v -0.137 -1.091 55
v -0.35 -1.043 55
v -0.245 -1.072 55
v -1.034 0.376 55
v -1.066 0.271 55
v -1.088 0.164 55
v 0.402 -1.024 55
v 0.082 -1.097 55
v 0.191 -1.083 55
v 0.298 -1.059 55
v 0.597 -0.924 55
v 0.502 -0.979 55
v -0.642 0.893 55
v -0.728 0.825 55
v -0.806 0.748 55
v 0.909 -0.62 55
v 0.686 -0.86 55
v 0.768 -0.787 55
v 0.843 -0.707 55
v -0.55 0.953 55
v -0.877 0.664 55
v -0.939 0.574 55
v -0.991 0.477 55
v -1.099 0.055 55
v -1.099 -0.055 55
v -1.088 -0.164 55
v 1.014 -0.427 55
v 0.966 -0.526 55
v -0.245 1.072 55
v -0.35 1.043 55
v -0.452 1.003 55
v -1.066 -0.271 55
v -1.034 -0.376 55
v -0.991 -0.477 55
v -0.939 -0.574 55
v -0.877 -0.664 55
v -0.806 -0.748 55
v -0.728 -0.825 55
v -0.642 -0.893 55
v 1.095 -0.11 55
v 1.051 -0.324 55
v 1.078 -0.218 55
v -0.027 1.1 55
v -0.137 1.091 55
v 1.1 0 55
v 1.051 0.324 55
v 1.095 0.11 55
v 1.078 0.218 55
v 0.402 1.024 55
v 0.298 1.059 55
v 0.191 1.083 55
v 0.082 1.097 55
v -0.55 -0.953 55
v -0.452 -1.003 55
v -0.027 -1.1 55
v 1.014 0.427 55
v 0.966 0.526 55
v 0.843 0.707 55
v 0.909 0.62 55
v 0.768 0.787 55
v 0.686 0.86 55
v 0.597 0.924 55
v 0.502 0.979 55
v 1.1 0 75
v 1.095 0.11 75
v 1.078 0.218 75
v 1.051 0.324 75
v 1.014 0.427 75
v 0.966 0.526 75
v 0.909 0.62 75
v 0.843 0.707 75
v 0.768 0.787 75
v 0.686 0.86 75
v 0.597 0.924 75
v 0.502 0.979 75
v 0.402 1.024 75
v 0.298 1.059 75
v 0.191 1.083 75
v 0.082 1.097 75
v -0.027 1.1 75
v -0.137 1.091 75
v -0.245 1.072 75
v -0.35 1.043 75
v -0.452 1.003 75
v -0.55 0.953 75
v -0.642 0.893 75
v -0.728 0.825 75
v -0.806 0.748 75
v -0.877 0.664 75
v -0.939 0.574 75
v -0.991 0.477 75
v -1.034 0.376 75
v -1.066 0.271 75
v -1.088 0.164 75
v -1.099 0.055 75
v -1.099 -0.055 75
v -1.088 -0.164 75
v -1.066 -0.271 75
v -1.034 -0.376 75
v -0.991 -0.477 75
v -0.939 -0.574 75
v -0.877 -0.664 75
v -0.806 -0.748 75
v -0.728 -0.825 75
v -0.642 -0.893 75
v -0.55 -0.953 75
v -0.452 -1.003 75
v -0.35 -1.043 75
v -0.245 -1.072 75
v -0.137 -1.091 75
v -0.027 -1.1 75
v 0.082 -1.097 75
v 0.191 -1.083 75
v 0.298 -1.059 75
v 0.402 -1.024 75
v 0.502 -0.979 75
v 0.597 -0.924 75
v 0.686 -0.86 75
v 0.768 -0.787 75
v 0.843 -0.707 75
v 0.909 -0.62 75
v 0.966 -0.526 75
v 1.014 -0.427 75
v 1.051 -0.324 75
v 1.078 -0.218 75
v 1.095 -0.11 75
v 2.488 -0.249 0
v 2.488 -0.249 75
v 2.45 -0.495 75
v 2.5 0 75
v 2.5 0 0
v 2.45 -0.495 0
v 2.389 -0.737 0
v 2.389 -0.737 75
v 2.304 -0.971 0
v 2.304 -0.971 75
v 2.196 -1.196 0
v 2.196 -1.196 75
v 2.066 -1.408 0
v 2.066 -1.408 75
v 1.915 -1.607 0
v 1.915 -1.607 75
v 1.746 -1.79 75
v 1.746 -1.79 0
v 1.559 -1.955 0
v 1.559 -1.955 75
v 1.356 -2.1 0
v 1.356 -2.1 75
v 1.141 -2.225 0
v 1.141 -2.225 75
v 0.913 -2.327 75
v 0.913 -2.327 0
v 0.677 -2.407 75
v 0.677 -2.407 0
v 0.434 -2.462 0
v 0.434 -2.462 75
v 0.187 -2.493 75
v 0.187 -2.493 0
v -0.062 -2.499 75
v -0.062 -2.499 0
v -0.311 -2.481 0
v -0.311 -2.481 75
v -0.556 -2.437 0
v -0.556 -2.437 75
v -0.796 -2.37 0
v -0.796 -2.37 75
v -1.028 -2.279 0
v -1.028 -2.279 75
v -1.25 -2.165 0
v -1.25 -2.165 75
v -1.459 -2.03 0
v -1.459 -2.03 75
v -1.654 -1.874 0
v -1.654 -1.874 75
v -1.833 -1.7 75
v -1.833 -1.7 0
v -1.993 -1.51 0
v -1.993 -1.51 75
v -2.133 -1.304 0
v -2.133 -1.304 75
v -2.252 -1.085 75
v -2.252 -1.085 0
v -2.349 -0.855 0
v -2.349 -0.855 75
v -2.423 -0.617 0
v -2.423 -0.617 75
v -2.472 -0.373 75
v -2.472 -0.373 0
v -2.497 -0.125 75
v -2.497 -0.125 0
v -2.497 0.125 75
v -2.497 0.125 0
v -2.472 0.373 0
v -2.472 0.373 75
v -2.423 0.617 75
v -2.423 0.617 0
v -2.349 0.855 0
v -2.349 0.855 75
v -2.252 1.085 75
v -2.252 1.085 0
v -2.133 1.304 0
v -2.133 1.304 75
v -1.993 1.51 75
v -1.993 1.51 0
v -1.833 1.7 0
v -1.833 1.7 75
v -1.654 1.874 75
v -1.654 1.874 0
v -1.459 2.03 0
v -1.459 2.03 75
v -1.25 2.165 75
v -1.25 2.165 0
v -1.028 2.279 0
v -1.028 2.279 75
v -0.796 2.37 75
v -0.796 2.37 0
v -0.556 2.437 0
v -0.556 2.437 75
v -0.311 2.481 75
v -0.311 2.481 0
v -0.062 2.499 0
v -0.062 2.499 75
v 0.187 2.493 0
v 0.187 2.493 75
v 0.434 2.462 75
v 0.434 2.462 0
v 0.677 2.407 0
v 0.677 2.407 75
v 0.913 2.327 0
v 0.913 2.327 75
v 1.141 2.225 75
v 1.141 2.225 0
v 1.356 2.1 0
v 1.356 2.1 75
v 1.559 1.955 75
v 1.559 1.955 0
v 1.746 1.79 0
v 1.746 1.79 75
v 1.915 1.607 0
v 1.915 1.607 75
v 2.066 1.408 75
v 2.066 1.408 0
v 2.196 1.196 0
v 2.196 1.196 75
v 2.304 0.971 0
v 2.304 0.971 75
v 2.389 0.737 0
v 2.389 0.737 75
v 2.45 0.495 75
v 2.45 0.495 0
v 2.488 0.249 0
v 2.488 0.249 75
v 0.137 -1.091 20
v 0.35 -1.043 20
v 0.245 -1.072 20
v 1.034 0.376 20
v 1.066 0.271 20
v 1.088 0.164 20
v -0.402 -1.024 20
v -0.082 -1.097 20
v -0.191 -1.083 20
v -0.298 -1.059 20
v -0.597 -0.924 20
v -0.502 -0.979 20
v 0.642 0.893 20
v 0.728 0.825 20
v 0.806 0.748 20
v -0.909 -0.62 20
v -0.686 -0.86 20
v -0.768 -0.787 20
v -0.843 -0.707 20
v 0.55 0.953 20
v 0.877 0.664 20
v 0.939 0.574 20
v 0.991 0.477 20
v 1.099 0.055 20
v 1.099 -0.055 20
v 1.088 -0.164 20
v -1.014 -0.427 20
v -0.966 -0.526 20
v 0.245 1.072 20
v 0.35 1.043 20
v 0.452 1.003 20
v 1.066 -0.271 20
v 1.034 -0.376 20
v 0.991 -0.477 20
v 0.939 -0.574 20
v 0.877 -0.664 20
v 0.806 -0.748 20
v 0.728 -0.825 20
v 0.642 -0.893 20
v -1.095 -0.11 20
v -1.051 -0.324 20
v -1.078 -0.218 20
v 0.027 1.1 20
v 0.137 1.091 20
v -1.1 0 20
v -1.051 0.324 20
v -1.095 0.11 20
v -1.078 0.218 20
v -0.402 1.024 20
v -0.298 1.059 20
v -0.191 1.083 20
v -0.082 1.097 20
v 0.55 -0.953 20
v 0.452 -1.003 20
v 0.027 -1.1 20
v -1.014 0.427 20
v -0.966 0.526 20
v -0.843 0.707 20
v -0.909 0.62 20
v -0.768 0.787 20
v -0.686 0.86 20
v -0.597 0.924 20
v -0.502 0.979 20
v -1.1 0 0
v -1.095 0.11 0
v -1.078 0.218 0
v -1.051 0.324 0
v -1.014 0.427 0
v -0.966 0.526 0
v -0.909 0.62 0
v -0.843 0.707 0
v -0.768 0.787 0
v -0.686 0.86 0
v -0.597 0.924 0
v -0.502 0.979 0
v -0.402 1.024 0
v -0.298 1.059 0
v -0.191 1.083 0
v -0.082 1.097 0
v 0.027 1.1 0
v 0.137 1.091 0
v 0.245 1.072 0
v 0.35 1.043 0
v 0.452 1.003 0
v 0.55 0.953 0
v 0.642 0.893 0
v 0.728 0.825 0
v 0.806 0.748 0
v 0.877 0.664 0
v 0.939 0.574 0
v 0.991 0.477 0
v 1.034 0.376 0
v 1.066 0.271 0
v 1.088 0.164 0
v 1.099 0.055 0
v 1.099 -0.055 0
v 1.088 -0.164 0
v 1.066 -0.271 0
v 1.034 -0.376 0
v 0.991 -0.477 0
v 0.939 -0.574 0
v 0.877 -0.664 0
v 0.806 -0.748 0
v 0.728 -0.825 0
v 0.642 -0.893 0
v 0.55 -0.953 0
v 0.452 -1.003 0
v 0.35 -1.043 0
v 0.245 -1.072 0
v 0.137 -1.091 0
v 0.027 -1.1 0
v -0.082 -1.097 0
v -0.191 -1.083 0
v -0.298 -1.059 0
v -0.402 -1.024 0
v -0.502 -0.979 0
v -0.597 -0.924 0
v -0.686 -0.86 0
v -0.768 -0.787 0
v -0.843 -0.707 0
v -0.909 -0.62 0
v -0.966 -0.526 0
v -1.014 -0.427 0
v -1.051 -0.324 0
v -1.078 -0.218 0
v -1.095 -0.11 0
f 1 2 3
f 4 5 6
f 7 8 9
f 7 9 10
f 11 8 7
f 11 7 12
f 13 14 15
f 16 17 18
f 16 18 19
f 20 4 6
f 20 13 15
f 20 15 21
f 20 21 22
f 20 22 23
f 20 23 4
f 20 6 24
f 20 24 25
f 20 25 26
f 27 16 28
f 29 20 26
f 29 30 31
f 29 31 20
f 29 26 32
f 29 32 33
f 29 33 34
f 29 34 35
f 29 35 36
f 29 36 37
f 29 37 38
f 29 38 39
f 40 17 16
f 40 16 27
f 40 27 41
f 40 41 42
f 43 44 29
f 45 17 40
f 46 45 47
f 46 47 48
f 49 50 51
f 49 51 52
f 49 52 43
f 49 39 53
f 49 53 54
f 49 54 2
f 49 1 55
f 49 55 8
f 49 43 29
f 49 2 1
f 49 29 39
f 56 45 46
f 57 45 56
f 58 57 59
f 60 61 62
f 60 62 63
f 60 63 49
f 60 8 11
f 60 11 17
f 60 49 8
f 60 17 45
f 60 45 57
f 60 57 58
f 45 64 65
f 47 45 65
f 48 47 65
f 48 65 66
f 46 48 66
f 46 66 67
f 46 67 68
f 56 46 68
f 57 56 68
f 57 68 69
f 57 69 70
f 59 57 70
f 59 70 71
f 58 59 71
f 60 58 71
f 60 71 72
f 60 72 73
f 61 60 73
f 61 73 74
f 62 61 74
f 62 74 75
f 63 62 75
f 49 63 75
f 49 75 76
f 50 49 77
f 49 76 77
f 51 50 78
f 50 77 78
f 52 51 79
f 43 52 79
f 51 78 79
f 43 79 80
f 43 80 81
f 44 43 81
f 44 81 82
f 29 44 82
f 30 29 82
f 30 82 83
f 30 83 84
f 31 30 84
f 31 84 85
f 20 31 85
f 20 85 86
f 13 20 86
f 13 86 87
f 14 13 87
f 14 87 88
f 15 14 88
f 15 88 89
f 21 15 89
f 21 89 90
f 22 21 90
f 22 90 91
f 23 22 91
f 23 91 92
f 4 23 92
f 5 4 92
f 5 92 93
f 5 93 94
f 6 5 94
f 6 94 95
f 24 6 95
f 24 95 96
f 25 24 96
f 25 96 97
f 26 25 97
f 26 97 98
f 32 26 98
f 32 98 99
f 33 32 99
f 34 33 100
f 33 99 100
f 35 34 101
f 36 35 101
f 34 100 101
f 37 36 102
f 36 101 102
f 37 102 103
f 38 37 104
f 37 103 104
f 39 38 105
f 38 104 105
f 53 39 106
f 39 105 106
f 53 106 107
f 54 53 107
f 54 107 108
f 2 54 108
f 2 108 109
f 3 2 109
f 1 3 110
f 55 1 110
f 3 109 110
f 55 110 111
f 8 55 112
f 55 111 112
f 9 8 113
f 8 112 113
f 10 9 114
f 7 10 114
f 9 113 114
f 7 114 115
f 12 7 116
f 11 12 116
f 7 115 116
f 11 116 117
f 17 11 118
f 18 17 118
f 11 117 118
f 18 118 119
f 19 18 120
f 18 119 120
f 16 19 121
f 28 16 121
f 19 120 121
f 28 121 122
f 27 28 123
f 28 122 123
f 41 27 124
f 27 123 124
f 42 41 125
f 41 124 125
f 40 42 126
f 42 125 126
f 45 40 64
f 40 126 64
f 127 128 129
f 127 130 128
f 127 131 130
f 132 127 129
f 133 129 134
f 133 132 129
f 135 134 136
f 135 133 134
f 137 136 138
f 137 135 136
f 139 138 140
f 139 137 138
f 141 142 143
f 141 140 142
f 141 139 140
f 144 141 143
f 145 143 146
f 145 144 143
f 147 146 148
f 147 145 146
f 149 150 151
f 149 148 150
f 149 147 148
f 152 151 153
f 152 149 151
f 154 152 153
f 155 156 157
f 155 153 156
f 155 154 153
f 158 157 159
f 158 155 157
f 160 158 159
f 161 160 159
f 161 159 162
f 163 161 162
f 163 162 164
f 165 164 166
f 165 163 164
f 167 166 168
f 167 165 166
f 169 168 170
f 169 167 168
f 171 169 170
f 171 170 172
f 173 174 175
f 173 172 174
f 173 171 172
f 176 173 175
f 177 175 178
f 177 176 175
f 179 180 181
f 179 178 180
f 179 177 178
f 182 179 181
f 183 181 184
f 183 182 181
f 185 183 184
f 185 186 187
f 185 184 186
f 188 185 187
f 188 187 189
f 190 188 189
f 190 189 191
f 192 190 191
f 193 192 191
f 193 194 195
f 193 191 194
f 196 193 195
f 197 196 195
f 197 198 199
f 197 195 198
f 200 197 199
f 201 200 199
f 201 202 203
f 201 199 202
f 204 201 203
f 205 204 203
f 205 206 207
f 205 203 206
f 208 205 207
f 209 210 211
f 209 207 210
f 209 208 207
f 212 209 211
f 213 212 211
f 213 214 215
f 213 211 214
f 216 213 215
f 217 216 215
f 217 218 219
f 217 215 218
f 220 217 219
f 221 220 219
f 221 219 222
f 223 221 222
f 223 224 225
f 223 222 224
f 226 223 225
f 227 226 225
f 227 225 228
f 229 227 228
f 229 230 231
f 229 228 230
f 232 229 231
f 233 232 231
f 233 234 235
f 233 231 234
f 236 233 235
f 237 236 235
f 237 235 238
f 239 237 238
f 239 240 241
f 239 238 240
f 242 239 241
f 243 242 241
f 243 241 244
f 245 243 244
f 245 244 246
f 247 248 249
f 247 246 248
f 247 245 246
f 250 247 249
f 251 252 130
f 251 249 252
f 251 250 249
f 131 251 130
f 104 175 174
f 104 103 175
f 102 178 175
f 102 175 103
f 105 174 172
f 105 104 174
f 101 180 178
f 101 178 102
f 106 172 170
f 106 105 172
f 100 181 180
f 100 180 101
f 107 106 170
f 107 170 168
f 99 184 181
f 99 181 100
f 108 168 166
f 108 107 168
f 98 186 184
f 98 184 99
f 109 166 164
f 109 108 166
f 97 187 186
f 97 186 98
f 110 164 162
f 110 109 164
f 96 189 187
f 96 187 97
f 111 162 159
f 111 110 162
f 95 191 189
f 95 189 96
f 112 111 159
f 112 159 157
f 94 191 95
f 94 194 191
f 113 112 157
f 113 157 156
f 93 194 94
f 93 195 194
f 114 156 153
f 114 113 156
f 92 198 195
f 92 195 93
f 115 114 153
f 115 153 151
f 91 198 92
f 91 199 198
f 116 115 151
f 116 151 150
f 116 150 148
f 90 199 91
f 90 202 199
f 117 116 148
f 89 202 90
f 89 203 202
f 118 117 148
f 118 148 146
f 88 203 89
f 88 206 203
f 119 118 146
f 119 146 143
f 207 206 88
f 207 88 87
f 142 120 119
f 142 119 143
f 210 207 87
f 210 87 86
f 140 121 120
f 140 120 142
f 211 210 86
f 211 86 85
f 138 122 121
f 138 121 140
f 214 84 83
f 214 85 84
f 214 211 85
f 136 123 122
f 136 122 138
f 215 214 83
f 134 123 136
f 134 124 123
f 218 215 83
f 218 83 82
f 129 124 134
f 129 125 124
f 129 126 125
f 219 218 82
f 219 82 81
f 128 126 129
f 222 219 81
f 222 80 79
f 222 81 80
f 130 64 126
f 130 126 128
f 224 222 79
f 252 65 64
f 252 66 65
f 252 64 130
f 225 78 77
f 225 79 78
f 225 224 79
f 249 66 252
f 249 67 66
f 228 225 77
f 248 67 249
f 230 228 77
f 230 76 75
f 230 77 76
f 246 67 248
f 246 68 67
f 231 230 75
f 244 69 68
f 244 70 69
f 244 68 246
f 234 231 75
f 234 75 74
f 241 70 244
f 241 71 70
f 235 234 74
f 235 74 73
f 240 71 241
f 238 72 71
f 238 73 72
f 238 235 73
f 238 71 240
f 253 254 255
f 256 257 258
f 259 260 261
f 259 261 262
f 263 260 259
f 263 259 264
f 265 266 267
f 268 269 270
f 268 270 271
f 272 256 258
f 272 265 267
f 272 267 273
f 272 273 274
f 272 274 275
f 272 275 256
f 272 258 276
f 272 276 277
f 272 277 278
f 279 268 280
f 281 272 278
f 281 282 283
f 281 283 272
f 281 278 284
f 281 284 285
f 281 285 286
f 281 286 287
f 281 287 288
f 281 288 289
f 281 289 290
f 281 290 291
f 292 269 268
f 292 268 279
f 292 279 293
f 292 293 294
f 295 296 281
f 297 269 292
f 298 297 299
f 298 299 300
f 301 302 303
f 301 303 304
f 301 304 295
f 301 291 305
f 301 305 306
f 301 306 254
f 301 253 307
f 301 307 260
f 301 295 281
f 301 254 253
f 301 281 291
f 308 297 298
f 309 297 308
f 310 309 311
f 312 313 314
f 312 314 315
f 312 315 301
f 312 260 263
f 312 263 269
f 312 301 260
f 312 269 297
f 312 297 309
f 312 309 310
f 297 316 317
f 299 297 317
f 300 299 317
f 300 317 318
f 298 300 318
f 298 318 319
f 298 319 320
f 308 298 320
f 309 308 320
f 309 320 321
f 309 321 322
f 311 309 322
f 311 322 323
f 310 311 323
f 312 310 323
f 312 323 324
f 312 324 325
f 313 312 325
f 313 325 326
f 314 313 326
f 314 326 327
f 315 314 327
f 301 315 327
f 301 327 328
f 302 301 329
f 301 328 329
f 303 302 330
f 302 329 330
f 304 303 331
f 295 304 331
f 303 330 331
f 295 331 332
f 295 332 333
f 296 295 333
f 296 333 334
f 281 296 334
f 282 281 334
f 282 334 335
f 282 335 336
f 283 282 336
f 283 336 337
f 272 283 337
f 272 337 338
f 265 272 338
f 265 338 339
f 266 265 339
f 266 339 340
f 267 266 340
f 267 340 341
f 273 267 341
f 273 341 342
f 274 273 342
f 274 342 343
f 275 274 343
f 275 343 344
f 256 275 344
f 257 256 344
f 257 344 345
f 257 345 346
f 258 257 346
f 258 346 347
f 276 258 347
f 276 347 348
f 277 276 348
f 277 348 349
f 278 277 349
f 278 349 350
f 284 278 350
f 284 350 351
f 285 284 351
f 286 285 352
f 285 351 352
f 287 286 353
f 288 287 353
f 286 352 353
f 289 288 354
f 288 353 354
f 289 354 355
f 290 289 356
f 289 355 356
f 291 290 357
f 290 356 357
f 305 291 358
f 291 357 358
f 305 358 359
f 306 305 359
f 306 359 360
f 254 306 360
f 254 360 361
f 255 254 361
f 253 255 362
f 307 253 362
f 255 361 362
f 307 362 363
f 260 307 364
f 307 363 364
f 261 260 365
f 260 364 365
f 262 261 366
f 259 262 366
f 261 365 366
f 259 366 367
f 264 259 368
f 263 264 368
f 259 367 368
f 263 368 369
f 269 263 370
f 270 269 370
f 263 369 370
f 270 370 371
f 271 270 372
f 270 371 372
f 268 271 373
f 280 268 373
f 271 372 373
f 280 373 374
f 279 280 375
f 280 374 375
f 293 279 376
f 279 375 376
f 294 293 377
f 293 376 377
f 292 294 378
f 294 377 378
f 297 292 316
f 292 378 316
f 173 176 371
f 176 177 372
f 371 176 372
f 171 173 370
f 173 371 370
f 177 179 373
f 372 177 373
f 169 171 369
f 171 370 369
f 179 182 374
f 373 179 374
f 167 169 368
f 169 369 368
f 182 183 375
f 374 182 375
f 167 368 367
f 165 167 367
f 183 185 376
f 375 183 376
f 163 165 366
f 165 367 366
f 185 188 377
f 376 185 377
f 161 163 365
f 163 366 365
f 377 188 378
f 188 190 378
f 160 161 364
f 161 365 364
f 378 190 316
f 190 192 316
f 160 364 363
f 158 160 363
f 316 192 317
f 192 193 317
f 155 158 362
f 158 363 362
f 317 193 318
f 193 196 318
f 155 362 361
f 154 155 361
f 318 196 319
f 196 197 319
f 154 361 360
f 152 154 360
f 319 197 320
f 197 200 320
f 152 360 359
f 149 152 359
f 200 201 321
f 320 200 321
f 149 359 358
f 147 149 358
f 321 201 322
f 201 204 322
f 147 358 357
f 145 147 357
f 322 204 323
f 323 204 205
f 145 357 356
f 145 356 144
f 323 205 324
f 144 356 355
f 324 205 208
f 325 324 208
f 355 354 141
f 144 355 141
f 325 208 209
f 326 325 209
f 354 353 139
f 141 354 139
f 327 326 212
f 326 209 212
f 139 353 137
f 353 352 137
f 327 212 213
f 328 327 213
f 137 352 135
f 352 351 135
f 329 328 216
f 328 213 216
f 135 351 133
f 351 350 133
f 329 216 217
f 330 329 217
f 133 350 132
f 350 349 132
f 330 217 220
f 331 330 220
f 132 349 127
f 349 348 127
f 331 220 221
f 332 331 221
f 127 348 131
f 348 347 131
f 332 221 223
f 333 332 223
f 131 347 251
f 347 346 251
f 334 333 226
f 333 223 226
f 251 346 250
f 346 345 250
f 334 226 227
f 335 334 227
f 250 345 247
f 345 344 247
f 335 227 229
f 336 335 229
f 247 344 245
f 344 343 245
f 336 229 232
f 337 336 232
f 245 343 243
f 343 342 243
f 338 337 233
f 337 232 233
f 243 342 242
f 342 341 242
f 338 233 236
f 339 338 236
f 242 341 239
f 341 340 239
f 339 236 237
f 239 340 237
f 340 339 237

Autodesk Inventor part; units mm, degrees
ref_plane "YZ Plane" through (0, 0, 0) normal (1, 0, 0) x (0, 1, 0)
ref_plane "XZ Plane" through (0, 0, 0) normal (0, 1, 0) x (-1, 0, 0)
ref_plane "XY Plane" through (0, 0, 0) normal (0, 0, 1) x (1, 0, 0)
sketch "Sketch1" plane through (0, 0, 0) normal (0, 0, 1) x (1, 0, 0)
  circle A0 centre (0, 0) radius 2.5
  dimension "d0" = 5
extrude "Extrusion1" add sketch "Sketch1" along normal blind 75
sketch "Sketch2" plane through (0, 0, 75) normal (0, 0, 1) x (1, 0, 0)
  circle A0 centre (0, 0) radius 1.1
  dimension "d3" = 2.2
extrude "Extrusion2" cut sketch "Sketch2" against normal blind 20
sketch "Sketch3" plane through (0, 0, 0) normal (0, 0, -1) x (-1, 0, 0)
  circle A0 centre (0, 0) radius 1.1 projected
extrude "Extrusion3" cut sketch "Sketch3" against normal blind 20
thread "Thread1" size "M2.5x0.45" class "6H" standard "ANSI Metric M Profile" length 16
thread "Thread2" size "M2.5x0.45" class "6H" standard "ANSI Metric M Profile" length 16
properties part number "AxisLinear"
